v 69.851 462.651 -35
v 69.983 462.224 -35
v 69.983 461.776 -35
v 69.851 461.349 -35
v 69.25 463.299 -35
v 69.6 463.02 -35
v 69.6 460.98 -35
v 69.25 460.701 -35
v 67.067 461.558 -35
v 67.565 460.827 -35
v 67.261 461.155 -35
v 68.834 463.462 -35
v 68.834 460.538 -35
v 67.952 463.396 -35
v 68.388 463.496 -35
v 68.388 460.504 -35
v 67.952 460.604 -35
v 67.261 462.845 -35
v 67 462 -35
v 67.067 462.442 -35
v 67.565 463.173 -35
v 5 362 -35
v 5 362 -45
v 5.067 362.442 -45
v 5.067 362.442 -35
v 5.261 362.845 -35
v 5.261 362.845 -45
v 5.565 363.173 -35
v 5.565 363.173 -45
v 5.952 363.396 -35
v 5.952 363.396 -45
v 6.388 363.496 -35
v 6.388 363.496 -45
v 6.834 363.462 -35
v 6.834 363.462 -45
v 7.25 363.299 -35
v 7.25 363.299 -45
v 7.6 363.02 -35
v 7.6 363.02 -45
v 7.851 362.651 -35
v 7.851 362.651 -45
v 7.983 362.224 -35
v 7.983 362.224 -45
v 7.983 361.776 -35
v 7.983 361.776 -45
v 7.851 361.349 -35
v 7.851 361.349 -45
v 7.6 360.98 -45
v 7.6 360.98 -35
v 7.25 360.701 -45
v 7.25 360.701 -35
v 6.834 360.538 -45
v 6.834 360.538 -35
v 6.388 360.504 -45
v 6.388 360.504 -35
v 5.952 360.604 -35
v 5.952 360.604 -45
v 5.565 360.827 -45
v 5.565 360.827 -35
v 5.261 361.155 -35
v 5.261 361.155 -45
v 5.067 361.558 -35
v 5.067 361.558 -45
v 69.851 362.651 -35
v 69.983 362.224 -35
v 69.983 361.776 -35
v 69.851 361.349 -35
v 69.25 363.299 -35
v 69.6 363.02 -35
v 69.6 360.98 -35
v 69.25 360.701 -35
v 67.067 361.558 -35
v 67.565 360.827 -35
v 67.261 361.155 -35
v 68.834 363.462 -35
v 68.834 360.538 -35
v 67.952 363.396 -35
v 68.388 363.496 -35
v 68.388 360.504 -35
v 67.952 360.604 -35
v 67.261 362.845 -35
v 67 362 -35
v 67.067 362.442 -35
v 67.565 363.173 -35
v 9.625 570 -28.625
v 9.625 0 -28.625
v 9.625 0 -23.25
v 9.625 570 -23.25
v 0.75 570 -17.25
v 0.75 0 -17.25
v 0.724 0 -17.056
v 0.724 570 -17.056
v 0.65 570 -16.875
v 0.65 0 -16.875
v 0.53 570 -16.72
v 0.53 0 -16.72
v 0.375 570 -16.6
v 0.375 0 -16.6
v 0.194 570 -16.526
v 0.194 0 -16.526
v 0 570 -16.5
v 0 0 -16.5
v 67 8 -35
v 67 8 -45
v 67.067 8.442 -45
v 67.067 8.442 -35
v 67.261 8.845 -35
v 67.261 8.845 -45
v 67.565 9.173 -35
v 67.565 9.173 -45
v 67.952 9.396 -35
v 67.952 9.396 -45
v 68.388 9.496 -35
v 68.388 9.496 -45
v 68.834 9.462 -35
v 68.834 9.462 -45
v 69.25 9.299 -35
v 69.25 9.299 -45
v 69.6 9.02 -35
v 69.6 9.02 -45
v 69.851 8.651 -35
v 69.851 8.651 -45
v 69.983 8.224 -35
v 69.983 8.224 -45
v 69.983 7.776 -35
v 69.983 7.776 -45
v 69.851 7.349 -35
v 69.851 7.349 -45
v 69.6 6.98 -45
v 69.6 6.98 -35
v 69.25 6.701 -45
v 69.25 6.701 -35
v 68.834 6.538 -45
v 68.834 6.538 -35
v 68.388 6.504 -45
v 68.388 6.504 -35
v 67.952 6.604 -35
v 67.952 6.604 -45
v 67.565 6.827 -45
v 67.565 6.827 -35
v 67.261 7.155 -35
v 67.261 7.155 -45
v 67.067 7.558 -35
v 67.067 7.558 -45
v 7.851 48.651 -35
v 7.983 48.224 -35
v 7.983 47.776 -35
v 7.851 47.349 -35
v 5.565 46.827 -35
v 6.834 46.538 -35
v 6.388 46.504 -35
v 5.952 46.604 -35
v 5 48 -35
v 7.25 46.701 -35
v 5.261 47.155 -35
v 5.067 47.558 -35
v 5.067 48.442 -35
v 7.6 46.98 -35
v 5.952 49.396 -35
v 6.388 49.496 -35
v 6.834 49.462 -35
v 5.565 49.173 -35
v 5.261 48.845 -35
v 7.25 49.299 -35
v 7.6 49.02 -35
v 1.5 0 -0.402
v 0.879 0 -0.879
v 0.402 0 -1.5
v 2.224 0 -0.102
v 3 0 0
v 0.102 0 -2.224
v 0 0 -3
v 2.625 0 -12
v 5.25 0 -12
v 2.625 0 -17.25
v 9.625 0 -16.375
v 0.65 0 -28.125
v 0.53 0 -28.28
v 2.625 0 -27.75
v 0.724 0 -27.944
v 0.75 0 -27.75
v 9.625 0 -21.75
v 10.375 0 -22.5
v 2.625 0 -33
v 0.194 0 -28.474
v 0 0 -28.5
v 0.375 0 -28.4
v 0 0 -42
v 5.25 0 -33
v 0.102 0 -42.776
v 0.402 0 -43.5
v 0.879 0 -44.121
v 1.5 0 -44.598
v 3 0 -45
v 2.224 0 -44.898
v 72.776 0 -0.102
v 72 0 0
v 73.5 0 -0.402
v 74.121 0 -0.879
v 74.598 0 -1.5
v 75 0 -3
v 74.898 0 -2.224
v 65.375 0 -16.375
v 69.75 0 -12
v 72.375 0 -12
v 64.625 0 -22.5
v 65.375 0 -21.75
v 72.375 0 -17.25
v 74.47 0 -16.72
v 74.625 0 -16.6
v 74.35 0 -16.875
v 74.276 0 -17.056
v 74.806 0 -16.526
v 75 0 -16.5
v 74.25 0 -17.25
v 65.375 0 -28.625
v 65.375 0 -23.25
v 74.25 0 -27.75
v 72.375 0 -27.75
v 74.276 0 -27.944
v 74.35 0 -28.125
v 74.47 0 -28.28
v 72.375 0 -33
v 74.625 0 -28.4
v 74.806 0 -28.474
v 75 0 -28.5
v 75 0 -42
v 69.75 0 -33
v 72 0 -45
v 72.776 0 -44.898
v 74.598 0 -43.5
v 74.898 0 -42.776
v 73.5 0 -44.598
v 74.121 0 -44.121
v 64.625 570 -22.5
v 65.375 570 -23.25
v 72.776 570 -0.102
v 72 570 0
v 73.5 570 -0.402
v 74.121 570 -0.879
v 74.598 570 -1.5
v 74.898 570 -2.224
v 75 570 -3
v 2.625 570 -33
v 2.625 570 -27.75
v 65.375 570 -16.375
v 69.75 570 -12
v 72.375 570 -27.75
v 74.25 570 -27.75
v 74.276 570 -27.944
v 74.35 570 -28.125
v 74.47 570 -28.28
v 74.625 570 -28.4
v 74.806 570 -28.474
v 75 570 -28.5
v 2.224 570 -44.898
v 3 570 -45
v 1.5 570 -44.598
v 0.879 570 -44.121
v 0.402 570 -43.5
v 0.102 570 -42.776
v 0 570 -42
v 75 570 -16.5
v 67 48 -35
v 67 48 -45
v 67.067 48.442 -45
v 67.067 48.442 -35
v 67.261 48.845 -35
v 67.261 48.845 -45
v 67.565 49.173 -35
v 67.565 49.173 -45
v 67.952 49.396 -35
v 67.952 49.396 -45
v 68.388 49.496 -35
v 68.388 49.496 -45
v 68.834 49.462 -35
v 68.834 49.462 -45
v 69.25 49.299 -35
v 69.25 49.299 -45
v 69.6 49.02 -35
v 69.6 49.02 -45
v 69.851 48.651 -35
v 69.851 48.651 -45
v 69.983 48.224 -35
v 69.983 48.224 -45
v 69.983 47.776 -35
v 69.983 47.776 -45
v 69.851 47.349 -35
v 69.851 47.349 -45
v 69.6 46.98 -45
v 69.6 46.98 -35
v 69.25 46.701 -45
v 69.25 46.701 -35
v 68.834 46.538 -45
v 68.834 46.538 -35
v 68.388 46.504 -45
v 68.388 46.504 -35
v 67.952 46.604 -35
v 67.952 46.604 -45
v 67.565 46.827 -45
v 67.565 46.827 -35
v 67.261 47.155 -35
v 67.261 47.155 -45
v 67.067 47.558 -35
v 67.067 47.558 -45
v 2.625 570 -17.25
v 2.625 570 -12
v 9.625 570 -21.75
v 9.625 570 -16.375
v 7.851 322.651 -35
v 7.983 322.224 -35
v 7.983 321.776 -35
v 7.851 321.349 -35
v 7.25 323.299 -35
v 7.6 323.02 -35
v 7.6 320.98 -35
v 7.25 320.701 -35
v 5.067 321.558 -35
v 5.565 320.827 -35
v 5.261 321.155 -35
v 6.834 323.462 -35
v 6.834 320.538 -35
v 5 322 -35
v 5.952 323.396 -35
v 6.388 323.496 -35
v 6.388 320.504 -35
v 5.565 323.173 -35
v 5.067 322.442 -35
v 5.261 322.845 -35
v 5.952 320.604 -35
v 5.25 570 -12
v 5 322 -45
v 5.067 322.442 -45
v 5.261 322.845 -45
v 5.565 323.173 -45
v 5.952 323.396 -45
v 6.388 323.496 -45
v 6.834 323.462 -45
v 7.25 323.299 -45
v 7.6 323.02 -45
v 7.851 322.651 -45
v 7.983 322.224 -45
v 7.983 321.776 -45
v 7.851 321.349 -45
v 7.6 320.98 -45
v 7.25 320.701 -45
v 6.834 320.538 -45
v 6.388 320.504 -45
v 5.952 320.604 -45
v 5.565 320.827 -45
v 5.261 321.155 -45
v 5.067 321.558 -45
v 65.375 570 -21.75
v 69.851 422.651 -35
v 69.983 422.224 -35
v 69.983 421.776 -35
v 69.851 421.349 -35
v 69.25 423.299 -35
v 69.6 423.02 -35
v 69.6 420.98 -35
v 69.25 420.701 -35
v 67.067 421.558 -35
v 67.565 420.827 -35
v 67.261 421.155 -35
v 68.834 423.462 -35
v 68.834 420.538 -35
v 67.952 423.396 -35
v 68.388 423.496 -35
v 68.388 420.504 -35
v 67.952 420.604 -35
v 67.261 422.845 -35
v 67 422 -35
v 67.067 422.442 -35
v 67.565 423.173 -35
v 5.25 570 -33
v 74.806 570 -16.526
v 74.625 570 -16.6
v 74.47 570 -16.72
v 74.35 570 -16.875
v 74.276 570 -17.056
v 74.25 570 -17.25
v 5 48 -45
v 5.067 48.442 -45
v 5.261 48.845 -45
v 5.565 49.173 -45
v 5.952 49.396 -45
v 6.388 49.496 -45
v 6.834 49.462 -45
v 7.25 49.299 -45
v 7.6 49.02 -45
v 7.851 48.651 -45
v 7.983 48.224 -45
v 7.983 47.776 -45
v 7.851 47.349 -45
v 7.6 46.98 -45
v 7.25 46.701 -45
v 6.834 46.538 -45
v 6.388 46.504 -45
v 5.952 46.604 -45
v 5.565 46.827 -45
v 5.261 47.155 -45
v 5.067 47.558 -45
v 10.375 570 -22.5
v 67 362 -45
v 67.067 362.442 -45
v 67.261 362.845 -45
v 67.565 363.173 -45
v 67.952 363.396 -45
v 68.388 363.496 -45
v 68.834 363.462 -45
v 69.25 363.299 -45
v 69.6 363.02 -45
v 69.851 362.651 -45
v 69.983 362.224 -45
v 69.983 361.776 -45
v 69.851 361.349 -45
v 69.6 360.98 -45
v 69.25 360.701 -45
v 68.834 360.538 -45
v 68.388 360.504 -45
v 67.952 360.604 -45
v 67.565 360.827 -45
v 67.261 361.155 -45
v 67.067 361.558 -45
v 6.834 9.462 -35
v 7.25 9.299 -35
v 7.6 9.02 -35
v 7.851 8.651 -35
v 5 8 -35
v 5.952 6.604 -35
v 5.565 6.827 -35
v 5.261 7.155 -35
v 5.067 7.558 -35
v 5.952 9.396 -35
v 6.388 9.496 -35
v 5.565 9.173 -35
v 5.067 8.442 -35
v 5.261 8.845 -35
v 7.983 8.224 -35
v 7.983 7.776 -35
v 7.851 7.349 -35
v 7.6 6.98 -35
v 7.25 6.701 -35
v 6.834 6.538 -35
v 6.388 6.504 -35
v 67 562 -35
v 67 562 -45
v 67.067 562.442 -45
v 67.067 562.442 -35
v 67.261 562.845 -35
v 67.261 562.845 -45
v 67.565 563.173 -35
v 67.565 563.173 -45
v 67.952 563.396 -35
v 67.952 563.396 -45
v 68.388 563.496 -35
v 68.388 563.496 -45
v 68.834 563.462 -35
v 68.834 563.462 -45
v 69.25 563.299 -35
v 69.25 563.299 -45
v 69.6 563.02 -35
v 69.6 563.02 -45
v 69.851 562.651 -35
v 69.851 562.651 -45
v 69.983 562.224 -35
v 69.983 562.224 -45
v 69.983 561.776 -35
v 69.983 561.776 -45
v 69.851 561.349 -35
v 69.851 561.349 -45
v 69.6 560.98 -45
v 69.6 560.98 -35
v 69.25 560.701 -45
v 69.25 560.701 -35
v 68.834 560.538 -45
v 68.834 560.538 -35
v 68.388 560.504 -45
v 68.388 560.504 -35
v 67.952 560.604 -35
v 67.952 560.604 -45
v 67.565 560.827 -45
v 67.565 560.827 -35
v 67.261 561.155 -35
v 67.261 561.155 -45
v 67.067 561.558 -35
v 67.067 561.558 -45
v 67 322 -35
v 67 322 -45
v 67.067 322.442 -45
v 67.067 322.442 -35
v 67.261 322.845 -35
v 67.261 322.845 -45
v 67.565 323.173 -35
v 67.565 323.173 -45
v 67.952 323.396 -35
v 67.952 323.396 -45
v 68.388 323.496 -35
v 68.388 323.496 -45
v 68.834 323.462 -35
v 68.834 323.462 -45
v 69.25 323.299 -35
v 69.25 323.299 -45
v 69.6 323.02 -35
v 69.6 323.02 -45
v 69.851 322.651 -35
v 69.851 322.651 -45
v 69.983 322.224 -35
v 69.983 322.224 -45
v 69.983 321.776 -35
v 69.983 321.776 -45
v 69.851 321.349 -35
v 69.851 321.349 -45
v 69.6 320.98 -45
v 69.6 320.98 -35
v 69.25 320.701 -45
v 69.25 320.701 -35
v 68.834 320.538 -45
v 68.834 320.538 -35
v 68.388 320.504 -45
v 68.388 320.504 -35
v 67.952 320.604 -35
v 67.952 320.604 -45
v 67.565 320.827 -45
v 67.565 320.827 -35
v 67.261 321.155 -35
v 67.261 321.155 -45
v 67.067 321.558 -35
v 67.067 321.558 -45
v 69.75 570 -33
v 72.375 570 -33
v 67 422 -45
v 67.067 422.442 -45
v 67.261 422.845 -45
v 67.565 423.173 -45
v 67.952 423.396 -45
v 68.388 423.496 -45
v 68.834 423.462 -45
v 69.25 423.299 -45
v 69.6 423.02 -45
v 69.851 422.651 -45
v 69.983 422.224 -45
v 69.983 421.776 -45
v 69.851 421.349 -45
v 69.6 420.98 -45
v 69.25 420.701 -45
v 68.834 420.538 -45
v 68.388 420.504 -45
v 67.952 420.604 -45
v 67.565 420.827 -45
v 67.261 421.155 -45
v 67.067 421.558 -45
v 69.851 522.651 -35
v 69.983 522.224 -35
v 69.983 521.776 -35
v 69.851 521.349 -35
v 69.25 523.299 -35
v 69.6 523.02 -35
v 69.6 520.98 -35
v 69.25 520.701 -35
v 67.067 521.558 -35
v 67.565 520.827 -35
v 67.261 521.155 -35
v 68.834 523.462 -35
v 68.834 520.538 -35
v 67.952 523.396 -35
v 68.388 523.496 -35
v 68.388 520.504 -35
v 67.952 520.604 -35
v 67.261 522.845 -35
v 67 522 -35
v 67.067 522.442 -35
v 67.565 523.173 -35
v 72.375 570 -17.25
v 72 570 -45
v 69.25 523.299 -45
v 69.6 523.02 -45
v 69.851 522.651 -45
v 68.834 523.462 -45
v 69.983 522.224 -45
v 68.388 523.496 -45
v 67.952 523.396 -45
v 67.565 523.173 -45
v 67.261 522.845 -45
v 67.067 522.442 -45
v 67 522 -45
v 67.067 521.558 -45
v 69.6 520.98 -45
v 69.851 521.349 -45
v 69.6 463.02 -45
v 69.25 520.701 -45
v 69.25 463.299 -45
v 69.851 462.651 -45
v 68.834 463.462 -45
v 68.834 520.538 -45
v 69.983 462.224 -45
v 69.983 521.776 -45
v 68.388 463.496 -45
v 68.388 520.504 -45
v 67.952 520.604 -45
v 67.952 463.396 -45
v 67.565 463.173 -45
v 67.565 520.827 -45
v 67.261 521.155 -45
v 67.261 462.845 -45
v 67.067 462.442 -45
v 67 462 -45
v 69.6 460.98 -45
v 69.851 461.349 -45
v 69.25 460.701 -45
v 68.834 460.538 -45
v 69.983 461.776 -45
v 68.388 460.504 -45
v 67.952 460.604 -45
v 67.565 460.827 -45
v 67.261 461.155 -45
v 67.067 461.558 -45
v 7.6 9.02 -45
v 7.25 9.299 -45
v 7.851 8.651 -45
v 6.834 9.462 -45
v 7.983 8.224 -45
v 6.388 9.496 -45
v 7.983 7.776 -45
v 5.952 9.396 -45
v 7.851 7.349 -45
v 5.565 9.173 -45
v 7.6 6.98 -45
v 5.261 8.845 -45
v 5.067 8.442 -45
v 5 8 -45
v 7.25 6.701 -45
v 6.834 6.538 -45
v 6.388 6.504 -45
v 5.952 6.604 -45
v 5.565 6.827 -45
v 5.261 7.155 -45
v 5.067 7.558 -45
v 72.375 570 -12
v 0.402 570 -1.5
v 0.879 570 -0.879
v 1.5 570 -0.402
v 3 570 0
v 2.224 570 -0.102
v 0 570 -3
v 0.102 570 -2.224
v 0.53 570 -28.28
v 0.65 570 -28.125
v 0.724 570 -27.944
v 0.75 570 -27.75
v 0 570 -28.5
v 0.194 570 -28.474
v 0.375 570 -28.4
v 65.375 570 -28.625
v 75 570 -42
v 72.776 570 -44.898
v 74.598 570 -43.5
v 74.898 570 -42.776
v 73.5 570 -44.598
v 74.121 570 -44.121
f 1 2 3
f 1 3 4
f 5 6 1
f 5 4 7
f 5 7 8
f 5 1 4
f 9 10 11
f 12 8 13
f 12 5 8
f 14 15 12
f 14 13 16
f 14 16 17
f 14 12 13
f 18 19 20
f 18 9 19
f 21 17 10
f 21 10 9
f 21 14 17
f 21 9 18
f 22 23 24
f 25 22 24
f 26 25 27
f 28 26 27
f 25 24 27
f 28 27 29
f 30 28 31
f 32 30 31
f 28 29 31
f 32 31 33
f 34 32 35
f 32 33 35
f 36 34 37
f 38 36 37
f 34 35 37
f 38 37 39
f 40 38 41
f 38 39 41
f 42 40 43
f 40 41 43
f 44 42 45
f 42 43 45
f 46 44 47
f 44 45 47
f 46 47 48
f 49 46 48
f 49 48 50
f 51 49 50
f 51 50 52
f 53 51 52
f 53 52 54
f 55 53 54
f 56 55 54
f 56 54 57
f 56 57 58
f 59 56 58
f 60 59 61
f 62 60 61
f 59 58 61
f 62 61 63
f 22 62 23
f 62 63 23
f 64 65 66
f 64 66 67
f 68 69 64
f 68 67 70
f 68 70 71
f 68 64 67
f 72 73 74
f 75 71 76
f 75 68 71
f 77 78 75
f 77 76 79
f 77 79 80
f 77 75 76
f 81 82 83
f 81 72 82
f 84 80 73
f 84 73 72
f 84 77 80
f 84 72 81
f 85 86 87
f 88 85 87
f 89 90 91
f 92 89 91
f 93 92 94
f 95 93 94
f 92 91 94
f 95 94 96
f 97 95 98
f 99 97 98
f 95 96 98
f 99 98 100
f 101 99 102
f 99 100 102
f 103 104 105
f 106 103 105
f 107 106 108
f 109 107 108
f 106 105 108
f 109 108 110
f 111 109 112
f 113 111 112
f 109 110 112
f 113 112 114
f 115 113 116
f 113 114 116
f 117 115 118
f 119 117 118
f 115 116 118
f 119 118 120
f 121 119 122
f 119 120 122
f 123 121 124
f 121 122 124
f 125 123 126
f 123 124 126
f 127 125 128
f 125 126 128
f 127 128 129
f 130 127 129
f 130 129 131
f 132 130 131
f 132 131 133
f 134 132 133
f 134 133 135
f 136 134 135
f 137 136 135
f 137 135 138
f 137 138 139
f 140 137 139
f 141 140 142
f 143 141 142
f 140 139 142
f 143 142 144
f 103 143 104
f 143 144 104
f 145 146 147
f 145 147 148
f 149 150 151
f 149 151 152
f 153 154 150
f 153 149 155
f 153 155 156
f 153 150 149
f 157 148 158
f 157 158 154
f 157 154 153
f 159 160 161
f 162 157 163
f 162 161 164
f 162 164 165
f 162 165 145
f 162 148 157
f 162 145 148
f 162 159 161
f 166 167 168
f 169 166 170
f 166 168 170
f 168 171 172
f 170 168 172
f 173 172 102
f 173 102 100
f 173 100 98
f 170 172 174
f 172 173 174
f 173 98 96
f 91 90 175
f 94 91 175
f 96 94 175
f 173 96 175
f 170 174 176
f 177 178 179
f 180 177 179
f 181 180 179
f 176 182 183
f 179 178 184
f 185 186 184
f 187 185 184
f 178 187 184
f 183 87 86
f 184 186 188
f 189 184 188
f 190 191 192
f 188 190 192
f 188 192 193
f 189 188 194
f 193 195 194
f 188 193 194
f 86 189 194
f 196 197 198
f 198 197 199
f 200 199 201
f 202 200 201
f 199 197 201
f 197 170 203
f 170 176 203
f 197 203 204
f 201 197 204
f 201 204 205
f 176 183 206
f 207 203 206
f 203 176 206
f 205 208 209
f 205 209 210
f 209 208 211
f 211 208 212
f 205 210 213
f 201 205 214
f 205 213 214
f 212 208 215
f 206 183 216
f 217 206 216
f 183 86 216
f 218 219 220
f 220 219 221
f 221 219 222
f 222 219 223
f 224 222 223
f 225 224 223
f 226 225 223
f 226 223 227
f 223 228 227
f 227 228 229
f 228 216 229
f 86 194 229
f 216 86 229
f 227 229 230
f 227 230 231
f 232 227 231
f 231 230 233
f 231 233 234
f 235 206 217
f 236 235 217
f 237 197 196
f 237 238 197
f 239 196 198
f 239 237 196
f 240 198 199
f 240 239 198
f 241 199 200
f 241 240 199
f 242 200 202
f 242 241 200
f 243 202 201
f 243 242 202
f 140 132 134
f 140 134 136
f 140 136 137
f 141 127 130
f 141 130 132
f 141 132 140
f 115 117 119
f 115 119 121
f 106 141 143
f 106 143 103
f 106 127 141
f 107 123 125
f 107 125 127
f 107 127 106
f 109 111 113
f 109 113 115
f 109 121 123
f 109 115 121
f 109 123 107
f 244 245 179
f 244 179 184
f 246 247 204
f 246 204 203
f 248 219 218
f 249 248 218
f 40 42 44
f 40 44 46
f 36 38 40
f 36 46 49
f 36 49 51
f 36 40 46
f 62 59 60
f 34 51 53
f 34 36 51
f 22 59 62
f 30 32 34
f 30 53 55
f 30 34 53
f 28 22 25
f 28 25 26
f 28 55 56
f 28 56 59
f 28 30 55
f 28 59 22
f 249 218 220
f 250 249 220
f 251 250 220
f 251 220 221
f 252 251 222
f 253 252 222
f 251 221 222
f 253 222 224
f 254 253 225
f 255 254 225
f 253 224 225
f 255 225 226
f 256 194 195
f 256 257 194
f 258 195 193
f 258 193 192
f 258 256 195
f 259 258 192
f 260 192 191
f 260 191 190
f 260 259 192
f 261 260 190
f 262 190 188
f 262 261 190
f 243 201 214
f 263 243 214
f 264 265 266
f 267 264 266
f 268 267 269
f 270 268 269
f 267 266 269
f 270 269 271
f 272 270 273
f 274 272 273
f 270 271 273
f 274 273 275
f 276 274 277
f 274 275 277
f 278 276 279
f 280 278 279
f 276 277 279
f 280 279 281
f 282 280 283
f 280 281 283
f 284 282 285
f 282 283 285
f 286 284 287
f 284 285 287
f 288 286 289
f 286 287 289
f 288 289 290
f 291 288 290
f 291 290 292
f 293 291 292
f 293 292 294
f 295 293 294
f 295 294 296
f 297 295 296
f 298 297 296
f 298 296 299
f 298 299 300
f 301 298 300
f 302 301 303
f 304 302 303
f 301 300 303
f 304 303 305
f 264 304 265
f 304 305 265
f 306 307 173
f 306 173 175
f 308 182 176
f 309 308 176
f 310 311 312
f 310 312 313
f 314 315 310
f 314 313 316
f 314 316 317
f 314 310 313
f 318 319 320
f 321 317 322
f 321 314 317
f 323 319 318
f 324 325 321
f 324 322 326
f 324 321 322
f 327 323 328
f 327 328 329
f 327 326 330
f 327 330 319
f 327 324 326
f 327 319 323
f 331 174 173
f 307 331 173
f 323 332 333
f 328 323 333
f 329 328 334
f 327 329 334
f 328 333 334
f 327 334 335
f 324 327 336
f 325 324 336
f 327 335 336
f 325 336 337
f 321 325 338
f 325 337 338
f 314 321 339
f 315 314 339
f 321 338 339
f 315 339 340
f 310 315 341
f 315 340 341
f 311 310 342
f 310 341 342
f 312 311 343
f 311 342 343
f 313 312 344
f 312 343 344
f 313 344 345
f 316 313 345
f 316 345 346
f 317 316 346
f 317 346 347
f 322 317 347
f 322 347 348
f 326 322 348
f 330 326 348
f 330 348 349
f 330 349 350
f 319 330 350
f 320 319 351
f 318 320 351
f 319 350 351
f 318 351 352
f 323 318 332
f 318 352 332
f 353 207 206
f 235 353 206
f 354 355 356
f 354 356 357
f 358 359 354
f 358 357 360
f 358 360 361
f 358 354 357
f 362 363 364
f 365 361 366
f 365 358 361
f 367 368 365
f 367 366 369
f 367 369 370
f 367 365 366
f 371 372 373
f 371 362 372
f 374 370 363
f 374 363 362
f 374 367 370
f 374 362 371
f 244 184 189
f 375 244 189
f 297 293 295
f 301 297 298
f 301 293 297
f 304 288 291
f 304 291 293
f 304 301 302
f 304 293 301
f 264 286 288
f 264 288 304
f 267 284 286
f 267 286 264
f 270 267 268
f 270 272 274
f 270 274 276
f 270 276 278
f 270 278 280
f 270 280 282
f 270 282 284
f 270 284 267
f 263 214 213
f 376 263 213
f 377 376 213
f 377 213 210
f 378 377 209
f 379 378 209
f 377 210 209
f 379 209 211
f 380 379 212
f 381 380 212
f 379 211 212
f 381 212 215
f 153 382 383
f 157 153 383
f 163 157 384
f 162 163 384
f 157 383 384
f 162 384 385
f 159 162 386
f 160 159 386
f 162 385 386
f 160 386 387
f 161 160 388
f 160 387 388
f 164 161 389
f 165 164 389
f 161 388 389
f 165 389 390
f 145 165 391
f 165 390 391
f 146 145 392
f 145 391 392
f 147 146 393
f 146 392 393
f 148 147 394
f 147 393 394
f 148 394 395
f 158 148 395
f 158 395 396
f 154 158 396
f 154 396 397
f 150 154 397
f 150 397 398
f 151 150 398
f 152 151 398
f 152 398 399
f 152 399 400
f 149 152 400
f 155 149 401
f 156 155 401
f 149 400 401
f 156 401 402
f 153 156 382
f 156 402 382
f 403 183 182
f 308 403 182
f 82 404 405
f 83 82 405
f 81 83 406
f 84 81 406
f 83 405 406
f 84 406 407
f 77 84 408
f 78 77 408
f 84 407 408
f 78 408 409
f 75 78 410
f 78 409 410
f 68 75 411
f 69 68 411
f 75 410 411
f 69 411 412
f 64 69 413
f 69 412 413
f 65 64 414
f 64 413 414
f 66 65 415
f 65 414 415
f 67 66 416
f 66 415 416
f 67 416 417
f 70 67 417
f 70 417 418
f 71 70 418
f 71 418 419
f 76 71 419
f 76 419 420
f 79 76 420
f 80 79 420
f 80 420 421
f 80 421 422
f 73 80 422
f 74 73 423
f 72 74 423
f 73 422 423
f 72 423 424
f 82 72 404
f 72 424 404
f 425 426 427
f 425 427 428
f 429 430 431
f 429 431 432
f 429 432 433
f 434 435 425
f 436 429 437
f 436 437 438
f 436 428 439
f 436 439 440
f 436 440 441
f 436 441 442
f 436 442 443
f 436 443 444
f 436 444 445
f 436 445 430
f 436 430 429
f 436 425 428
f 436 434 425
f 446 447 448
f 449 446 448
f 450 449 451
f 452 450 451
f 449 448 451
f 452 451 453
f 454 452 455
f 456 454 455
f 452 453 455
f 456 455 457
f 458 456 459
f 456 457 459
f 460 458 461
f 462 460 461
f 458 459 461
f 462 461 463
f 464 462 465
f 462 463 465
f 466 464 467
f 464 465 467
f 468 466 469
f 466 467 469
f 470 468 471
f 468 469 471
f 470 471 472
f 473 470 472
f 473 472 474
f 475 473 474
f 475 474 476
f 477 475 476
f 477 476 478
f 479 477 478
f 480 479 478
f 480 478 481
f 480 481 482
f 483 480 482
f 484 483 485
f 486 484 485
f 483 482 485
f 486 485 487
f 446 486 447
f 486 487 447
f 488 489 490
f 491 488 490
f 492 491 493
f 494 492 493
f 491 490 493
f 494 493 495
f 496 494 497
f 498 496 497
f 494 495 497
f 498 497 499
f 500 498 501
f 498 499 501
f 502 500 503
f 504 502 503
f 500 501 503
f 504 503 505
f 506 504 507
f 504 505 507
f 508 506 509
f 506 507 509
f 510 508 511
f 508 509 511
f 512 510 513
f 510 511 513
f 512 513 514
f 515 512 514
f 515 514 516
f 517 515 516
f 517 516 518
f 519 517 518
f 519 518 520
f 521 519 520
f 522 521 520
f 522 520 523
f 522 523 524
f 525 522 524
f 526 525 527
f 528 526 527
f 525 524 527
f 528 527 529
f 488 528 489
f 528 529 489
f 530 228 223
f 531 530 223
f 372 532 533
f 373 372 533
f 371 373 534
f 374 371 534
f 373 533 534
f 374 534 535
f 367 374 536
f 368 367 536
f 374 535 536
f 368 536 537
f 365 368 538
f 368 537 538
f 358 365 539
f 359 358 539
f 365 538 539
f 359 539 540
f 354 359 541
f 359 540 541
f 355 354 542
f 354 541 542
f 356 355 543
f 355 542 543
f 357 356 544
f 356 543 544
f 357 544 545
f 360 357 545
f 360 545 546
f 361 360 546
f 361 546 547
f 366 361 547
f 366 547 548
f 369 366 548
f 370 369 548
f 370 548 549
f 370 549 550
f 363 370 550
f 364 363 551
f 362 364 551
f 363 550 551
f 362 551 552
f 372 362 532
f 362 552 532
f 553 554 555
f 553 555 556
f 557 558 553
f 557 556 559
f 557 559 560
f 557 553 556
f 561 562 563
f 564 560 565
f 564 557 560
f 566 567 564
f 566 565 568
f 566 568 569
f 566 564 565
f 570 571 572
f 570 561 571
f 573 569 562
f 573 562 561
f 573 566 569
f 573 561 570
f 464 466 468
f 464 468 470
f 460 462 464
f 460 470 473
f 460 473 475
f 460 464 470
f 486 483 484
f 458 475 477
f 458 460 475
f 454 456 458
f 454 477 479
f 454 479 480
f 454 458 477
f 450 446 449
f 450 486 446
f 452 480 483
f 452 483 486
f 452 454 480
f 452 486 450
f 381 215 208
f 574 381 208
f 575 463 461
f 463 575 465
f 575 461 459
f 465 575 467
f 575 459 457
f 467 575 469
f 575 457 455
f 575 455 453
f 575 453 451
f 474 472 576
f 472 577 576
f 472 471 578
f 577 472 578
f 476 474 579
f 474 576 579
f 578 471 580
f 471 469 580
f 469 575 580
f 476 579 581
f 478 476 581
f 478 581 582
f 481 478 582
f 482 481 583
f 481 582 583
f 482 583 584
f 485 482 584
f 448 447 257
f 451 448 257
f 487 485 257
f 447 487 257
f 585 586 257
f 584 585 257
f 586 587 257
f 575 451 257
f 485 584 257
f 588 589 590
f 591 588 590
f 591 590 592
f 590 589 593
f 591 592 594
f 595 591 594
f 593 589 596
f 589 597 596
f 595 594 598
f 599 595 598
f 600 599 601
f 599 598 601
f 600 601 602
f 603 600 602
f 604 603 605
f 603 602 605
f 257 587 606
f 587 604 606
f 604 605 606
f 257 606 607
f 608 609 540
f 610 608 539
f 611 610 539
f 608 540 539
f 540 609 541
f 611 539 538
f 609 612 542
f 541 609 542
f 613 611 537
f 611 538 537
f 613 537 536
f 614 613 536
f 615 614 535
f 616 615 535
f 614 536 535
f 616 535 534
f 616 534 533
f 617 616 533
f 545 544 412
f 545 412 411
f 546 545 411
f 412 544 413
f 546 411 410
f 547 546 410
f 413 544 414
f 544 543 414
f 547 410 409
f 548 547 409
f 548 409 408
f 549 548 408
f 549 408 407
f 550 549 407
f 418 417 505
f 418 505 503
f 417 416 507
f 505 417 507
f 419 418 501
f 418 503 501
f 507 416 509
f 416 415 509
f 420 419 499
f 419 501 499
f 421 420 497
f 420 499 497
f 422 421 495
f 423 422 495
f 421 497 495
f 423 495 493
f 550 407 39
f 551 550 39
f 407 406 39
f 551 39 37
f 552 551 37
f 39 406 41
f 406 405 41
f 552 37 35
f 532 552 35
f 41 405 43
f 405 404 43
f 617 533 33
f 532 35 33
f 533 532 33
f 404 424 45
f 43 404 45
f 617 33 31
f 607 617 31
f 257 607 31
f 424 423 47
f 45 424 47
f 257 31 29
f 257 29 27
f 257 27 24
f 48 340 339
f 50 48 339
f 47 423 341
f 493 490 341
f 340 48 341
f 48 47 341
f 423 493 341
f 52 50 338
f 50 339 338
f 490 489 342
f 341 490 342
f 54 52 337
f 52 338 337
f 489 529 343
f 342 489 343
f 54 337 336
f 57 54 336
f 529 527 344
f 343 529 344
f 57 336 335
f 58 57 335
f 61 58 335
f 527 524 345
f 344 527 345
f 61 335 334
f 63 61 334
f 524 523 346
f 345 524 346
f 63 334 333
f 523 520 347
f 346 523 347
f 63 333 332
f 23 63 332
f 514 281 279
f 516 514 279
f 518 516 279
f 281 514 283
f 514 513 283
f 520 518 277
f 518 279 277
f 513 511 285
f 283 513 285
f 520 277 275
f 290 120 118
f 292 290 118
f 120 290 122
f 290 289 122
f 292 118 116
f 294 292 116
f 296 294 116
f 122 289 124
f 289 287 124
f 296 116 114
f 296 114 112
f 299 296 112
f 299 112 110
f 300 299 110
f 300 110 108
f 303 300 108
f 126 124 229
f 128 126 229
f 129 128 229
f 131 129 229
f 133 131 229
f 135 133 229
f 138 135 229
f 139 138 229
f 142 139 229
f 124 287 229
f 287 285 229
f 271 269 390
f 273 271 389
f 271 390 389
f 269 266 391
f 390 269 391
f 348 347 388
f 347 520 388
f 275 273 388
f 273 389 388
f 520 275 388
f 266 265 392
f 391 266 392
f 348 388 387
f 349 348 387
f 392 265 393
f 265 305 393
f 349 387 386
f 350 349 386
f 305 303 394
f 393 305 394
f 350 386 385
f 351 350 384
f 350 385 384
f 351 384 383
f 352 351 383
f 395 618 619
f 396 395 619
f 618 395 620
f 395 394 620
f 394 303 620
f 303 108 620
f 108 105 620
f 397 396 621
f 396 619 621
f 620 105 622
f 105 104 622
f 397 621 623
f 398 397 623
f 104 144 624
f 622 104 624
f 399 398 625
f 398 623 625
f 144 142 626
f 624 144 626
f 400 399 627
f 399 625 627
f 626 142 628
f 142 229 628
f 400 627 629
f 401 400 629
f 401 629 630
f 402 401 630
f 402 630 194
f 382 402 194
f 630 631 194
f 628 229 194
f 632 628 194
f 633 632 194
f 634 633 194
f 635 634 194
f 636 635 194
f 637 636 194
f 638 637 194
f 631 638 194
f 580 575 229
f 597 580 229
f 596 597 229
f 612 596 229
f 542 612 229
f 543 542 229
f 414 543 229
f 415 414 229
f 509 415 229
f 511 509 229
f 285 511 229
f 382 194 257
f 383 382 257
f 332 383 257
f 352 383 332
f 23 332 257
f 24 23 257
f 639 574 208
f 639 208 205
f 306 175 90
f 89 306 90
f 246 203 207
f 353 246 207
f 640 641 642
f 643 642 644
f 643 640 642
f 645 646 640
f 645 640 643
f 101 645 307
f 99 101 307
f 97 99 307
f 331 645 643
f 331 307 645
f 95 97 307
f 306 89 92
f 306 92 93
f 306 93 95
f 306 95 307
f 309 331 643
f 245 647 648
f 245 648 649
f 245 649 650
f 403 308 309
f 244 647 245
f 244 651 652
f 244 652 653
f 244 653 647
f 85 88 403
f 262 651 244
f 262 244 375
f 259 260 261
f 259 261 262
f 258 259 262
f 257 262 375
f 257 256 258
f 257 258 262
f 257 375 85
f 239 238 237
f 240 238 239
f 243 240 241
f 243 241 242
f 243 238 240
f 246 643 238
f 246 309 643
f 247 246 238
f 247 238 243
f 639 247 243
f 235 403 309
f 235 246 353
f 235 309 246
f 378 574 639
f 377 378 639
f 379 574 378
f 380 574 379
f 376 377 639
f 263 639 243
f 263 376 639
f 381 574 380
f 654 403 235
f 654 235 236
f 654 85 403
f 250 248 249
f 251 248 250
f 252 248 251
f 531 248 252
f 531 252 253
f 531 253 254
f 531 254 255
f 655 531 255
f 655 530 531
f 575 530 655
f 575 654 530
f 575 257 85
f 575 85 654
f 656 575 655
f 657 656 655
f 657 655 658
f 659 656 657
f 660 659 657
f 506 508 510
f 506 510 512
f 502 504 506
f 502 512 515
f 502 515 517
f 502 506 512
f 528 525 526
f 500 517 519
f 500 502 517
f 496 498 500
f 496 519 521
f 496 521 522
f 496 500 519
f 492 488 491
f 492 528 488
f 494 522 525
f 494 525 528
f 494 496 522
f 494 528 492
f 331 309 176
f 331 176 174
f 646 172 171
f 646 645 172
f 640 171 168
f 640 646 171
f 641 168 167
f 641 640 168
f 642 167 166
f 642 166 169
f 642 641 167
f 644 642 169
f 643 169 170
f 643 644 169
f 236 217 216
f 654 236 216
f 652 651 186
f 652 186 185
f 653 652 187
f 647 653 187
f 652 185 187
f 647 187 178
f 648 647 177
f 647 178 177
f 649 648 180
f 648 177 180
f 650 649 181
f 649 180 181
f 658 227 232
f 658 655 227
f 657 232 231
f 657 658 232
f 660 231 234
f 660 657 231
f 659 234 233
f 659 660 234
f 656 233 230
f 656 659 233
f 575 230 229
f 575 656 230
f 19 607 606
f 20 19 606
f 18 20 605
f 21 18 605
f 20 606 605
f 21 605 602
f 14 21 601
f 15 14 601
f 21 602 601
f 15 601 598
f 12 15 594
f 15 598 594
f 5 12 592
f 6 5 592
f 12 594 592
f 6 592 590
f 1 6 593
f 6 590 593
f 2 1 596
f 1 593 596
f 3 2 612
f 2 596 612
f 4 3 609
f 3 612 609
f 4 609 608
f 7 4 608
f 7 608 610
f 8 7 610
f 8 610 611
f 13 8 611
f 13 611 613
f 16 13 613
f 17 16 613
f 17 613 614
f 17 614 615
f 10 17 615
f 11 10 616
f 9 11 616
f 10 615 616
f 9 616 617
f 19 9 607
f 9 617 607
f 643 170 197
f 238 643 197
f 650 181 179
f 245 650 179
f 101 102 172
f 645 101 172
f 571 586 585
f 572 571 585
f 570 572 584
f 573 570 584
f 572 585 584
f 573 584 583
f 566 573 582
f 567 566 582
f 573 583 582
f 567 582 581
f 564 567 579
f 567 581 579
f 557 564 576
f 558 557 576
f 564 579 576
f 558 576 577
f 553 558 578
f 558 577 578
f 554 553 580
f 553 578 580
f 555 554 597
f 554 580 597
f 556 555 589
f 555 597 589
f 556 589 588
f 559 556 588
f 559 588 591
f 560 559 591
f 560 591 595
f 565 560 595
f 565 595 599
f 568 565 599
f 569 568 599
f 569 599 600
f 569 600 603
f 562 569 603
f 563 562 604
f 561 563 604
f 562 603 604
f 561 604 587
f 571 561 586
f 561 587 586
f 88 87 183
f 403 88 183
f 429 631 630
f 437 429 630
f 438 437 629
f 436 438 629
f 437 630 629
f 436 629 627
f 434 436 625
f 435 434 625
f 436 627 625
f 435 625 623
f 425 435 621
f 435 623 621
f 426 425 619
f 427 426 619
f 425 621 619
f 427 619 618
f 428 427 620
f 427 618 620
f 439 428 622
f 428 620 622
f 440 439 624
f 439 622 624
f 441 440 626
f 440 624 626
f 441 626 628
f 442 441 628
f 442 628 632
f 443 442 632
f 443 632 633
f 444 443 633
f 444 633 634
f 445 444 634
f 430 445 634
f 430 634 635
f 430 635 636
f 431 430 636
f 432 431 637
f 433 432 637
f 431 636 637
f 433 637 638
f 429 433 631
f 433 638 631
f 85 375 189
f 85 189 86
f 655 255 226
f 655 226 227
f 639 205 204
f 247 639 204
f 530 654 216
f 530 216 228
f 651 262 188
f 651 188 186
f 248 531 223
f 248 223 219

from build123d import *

# Parameters (mm, degrees)
BOSS_EXTRUDE1_DEPTH = 570
FILLET1_R           = 3
SKETCH2_R           = 1.5
CUT_EXTRUDE1_DEPTH  = 10


with BuildPart() as part:
    # Sketch1 → Boss-Extrude1 (new body)
    with BuildSketch(Plane(origin=(0, 0, 0), x_dir=(1, 0, 0), z_dir=(0, 1, 0))):
        with BuildLine():
            Line((2.625, 17.250000178), (0.75, 17.250000178))
            ThreePointArc((0.75, 17.250000178), (0.530330086, 16.719670092), (0, 16.500000178))
            Line((0, 16.500000178), (0, 0))
            Line((0, 0), (75, 0))
            Line((75, 0), (75, 16.500000178))
            ThreePointArc((75, 16.500000178), (74.469669914, 16.719670092), (74.25, 17.250000178))
            Line((74.25, 17.250000178), (72.375, 17.250000178))
            Line((72.375, 17.250000178), (72.375, 12.000000178))
            Line((72.375, 12.000000178), (69.75, 12.000000178))
            Line((69.75, 12.000000178), (65.375, 16.375))
            Line((65.375, 16.375), (65.375, 21.75))
            Line((65.375, 21.75), (64.625, 22.5))
            Line((64.625, 22.5), (65.375, 23.25))
            Line((65.375, 23.25), (65.375, 28.625))
            Line((65.375, 28.625), (69.75, 33.000000178))
            Line((69.75, 33.000000178), (72.375, 33.000000178))
            Line((72.375, 33.000000178), (72.375, 27.750000178))
            Line((72.375, 27.750000178), (74.25, 27.750000178))
            ThreePointArc((74.25, 27.750000178), (74.469669914, 28.280330264), (75, 28.500000178))
            Line((75, 28.500000178), (75, 45))
            Line((75, 45), (0, 45))
            Line((0, 45), (0, 28.500000178))
            ThreePointArc((0, 28.500000178), (0.530330086, 28.280330264), (0.75, 27.750000178))
            Line((0.75, 27.750000178), (2.625, 27.750000178))
            Line((2.625, 27.750000178), (2.625, 33.000000178))
            Line((2.625, 33.000000178), (5.25, 33.000000178))
            Line((5.25, 33.000000178), (9.625, 28.625))
            Line((9.625, 28.625), (9.625, 23.25))
            Line((9.625, 23.25), (10.375, 22.5))
            Line((10.375, 22.5), (9.625, 21.75))
            Line((9.625, 21.75), (9.625, 16.375))
            Line((9.625, 16.375), (5.25, 12.000000178))
            Line((5.25, 12.000000178), (2.625, 12.000000178))
            Line((2.625, 12.000000178), (2.625, 17.250000178))
        make_face()
    extrude(amount=BOSS_EXTRUDE1_DEPTH)

    # Fillet1
    fillet1_edges = [part.edges().sort_by_distance(p)[0] for p in [
        (0, 285, 0),
        (0, 285, -45),
        (75, 285, -45),
        (75, 285, 0),
    ]]
    fillet(fillet1_edges, radius=FILLET1_R)

    # Sketch2 → Cut-Extrude1 (cut)
    with BuildSketch(Plane(origin=(0, 0, -45), x_dir=(-1, 0, 0), z_dir=(0, 0, -1))):
        with Locations((-6.5, 48)):
            Circle(SKETCH2_R)
        with Locations((-6.5, 8)):
            Circle(SKETCH2_R)
        with Locations((-68.5, 48)):
            Circle(SKETCH2_R)
        with Locations((-68.5, 8)):
            Circle(SKETCH2_R)
        with Locations((-68.5, 562)):
            Circle(SKETCH2_R)
        with Locations((-68.5, 522)):
            Circle(SKETCH2_R)
        with Locations((-68.5, 462)):
            Circle(SKETCH2_R)
        with Locations((-68.5, 422)):
            Circle(SKETCH2_R)
        with Locations((-68.5, 362)):
            Circle(SKETCH2_R)
        with Locations((-68.5, 322)):
            Circle(SKETCH2_R)
        with Locations((-6.5, 362)):
            Circle(SKETCH2_R)
        with Locations((-6.5, 322)):
            Circle(SKETCH2_R)
    extrude(amount=-CUT_EXTRUDE1_DEPTH, mode=Mode.SUBTRACT)


solid = part.part
